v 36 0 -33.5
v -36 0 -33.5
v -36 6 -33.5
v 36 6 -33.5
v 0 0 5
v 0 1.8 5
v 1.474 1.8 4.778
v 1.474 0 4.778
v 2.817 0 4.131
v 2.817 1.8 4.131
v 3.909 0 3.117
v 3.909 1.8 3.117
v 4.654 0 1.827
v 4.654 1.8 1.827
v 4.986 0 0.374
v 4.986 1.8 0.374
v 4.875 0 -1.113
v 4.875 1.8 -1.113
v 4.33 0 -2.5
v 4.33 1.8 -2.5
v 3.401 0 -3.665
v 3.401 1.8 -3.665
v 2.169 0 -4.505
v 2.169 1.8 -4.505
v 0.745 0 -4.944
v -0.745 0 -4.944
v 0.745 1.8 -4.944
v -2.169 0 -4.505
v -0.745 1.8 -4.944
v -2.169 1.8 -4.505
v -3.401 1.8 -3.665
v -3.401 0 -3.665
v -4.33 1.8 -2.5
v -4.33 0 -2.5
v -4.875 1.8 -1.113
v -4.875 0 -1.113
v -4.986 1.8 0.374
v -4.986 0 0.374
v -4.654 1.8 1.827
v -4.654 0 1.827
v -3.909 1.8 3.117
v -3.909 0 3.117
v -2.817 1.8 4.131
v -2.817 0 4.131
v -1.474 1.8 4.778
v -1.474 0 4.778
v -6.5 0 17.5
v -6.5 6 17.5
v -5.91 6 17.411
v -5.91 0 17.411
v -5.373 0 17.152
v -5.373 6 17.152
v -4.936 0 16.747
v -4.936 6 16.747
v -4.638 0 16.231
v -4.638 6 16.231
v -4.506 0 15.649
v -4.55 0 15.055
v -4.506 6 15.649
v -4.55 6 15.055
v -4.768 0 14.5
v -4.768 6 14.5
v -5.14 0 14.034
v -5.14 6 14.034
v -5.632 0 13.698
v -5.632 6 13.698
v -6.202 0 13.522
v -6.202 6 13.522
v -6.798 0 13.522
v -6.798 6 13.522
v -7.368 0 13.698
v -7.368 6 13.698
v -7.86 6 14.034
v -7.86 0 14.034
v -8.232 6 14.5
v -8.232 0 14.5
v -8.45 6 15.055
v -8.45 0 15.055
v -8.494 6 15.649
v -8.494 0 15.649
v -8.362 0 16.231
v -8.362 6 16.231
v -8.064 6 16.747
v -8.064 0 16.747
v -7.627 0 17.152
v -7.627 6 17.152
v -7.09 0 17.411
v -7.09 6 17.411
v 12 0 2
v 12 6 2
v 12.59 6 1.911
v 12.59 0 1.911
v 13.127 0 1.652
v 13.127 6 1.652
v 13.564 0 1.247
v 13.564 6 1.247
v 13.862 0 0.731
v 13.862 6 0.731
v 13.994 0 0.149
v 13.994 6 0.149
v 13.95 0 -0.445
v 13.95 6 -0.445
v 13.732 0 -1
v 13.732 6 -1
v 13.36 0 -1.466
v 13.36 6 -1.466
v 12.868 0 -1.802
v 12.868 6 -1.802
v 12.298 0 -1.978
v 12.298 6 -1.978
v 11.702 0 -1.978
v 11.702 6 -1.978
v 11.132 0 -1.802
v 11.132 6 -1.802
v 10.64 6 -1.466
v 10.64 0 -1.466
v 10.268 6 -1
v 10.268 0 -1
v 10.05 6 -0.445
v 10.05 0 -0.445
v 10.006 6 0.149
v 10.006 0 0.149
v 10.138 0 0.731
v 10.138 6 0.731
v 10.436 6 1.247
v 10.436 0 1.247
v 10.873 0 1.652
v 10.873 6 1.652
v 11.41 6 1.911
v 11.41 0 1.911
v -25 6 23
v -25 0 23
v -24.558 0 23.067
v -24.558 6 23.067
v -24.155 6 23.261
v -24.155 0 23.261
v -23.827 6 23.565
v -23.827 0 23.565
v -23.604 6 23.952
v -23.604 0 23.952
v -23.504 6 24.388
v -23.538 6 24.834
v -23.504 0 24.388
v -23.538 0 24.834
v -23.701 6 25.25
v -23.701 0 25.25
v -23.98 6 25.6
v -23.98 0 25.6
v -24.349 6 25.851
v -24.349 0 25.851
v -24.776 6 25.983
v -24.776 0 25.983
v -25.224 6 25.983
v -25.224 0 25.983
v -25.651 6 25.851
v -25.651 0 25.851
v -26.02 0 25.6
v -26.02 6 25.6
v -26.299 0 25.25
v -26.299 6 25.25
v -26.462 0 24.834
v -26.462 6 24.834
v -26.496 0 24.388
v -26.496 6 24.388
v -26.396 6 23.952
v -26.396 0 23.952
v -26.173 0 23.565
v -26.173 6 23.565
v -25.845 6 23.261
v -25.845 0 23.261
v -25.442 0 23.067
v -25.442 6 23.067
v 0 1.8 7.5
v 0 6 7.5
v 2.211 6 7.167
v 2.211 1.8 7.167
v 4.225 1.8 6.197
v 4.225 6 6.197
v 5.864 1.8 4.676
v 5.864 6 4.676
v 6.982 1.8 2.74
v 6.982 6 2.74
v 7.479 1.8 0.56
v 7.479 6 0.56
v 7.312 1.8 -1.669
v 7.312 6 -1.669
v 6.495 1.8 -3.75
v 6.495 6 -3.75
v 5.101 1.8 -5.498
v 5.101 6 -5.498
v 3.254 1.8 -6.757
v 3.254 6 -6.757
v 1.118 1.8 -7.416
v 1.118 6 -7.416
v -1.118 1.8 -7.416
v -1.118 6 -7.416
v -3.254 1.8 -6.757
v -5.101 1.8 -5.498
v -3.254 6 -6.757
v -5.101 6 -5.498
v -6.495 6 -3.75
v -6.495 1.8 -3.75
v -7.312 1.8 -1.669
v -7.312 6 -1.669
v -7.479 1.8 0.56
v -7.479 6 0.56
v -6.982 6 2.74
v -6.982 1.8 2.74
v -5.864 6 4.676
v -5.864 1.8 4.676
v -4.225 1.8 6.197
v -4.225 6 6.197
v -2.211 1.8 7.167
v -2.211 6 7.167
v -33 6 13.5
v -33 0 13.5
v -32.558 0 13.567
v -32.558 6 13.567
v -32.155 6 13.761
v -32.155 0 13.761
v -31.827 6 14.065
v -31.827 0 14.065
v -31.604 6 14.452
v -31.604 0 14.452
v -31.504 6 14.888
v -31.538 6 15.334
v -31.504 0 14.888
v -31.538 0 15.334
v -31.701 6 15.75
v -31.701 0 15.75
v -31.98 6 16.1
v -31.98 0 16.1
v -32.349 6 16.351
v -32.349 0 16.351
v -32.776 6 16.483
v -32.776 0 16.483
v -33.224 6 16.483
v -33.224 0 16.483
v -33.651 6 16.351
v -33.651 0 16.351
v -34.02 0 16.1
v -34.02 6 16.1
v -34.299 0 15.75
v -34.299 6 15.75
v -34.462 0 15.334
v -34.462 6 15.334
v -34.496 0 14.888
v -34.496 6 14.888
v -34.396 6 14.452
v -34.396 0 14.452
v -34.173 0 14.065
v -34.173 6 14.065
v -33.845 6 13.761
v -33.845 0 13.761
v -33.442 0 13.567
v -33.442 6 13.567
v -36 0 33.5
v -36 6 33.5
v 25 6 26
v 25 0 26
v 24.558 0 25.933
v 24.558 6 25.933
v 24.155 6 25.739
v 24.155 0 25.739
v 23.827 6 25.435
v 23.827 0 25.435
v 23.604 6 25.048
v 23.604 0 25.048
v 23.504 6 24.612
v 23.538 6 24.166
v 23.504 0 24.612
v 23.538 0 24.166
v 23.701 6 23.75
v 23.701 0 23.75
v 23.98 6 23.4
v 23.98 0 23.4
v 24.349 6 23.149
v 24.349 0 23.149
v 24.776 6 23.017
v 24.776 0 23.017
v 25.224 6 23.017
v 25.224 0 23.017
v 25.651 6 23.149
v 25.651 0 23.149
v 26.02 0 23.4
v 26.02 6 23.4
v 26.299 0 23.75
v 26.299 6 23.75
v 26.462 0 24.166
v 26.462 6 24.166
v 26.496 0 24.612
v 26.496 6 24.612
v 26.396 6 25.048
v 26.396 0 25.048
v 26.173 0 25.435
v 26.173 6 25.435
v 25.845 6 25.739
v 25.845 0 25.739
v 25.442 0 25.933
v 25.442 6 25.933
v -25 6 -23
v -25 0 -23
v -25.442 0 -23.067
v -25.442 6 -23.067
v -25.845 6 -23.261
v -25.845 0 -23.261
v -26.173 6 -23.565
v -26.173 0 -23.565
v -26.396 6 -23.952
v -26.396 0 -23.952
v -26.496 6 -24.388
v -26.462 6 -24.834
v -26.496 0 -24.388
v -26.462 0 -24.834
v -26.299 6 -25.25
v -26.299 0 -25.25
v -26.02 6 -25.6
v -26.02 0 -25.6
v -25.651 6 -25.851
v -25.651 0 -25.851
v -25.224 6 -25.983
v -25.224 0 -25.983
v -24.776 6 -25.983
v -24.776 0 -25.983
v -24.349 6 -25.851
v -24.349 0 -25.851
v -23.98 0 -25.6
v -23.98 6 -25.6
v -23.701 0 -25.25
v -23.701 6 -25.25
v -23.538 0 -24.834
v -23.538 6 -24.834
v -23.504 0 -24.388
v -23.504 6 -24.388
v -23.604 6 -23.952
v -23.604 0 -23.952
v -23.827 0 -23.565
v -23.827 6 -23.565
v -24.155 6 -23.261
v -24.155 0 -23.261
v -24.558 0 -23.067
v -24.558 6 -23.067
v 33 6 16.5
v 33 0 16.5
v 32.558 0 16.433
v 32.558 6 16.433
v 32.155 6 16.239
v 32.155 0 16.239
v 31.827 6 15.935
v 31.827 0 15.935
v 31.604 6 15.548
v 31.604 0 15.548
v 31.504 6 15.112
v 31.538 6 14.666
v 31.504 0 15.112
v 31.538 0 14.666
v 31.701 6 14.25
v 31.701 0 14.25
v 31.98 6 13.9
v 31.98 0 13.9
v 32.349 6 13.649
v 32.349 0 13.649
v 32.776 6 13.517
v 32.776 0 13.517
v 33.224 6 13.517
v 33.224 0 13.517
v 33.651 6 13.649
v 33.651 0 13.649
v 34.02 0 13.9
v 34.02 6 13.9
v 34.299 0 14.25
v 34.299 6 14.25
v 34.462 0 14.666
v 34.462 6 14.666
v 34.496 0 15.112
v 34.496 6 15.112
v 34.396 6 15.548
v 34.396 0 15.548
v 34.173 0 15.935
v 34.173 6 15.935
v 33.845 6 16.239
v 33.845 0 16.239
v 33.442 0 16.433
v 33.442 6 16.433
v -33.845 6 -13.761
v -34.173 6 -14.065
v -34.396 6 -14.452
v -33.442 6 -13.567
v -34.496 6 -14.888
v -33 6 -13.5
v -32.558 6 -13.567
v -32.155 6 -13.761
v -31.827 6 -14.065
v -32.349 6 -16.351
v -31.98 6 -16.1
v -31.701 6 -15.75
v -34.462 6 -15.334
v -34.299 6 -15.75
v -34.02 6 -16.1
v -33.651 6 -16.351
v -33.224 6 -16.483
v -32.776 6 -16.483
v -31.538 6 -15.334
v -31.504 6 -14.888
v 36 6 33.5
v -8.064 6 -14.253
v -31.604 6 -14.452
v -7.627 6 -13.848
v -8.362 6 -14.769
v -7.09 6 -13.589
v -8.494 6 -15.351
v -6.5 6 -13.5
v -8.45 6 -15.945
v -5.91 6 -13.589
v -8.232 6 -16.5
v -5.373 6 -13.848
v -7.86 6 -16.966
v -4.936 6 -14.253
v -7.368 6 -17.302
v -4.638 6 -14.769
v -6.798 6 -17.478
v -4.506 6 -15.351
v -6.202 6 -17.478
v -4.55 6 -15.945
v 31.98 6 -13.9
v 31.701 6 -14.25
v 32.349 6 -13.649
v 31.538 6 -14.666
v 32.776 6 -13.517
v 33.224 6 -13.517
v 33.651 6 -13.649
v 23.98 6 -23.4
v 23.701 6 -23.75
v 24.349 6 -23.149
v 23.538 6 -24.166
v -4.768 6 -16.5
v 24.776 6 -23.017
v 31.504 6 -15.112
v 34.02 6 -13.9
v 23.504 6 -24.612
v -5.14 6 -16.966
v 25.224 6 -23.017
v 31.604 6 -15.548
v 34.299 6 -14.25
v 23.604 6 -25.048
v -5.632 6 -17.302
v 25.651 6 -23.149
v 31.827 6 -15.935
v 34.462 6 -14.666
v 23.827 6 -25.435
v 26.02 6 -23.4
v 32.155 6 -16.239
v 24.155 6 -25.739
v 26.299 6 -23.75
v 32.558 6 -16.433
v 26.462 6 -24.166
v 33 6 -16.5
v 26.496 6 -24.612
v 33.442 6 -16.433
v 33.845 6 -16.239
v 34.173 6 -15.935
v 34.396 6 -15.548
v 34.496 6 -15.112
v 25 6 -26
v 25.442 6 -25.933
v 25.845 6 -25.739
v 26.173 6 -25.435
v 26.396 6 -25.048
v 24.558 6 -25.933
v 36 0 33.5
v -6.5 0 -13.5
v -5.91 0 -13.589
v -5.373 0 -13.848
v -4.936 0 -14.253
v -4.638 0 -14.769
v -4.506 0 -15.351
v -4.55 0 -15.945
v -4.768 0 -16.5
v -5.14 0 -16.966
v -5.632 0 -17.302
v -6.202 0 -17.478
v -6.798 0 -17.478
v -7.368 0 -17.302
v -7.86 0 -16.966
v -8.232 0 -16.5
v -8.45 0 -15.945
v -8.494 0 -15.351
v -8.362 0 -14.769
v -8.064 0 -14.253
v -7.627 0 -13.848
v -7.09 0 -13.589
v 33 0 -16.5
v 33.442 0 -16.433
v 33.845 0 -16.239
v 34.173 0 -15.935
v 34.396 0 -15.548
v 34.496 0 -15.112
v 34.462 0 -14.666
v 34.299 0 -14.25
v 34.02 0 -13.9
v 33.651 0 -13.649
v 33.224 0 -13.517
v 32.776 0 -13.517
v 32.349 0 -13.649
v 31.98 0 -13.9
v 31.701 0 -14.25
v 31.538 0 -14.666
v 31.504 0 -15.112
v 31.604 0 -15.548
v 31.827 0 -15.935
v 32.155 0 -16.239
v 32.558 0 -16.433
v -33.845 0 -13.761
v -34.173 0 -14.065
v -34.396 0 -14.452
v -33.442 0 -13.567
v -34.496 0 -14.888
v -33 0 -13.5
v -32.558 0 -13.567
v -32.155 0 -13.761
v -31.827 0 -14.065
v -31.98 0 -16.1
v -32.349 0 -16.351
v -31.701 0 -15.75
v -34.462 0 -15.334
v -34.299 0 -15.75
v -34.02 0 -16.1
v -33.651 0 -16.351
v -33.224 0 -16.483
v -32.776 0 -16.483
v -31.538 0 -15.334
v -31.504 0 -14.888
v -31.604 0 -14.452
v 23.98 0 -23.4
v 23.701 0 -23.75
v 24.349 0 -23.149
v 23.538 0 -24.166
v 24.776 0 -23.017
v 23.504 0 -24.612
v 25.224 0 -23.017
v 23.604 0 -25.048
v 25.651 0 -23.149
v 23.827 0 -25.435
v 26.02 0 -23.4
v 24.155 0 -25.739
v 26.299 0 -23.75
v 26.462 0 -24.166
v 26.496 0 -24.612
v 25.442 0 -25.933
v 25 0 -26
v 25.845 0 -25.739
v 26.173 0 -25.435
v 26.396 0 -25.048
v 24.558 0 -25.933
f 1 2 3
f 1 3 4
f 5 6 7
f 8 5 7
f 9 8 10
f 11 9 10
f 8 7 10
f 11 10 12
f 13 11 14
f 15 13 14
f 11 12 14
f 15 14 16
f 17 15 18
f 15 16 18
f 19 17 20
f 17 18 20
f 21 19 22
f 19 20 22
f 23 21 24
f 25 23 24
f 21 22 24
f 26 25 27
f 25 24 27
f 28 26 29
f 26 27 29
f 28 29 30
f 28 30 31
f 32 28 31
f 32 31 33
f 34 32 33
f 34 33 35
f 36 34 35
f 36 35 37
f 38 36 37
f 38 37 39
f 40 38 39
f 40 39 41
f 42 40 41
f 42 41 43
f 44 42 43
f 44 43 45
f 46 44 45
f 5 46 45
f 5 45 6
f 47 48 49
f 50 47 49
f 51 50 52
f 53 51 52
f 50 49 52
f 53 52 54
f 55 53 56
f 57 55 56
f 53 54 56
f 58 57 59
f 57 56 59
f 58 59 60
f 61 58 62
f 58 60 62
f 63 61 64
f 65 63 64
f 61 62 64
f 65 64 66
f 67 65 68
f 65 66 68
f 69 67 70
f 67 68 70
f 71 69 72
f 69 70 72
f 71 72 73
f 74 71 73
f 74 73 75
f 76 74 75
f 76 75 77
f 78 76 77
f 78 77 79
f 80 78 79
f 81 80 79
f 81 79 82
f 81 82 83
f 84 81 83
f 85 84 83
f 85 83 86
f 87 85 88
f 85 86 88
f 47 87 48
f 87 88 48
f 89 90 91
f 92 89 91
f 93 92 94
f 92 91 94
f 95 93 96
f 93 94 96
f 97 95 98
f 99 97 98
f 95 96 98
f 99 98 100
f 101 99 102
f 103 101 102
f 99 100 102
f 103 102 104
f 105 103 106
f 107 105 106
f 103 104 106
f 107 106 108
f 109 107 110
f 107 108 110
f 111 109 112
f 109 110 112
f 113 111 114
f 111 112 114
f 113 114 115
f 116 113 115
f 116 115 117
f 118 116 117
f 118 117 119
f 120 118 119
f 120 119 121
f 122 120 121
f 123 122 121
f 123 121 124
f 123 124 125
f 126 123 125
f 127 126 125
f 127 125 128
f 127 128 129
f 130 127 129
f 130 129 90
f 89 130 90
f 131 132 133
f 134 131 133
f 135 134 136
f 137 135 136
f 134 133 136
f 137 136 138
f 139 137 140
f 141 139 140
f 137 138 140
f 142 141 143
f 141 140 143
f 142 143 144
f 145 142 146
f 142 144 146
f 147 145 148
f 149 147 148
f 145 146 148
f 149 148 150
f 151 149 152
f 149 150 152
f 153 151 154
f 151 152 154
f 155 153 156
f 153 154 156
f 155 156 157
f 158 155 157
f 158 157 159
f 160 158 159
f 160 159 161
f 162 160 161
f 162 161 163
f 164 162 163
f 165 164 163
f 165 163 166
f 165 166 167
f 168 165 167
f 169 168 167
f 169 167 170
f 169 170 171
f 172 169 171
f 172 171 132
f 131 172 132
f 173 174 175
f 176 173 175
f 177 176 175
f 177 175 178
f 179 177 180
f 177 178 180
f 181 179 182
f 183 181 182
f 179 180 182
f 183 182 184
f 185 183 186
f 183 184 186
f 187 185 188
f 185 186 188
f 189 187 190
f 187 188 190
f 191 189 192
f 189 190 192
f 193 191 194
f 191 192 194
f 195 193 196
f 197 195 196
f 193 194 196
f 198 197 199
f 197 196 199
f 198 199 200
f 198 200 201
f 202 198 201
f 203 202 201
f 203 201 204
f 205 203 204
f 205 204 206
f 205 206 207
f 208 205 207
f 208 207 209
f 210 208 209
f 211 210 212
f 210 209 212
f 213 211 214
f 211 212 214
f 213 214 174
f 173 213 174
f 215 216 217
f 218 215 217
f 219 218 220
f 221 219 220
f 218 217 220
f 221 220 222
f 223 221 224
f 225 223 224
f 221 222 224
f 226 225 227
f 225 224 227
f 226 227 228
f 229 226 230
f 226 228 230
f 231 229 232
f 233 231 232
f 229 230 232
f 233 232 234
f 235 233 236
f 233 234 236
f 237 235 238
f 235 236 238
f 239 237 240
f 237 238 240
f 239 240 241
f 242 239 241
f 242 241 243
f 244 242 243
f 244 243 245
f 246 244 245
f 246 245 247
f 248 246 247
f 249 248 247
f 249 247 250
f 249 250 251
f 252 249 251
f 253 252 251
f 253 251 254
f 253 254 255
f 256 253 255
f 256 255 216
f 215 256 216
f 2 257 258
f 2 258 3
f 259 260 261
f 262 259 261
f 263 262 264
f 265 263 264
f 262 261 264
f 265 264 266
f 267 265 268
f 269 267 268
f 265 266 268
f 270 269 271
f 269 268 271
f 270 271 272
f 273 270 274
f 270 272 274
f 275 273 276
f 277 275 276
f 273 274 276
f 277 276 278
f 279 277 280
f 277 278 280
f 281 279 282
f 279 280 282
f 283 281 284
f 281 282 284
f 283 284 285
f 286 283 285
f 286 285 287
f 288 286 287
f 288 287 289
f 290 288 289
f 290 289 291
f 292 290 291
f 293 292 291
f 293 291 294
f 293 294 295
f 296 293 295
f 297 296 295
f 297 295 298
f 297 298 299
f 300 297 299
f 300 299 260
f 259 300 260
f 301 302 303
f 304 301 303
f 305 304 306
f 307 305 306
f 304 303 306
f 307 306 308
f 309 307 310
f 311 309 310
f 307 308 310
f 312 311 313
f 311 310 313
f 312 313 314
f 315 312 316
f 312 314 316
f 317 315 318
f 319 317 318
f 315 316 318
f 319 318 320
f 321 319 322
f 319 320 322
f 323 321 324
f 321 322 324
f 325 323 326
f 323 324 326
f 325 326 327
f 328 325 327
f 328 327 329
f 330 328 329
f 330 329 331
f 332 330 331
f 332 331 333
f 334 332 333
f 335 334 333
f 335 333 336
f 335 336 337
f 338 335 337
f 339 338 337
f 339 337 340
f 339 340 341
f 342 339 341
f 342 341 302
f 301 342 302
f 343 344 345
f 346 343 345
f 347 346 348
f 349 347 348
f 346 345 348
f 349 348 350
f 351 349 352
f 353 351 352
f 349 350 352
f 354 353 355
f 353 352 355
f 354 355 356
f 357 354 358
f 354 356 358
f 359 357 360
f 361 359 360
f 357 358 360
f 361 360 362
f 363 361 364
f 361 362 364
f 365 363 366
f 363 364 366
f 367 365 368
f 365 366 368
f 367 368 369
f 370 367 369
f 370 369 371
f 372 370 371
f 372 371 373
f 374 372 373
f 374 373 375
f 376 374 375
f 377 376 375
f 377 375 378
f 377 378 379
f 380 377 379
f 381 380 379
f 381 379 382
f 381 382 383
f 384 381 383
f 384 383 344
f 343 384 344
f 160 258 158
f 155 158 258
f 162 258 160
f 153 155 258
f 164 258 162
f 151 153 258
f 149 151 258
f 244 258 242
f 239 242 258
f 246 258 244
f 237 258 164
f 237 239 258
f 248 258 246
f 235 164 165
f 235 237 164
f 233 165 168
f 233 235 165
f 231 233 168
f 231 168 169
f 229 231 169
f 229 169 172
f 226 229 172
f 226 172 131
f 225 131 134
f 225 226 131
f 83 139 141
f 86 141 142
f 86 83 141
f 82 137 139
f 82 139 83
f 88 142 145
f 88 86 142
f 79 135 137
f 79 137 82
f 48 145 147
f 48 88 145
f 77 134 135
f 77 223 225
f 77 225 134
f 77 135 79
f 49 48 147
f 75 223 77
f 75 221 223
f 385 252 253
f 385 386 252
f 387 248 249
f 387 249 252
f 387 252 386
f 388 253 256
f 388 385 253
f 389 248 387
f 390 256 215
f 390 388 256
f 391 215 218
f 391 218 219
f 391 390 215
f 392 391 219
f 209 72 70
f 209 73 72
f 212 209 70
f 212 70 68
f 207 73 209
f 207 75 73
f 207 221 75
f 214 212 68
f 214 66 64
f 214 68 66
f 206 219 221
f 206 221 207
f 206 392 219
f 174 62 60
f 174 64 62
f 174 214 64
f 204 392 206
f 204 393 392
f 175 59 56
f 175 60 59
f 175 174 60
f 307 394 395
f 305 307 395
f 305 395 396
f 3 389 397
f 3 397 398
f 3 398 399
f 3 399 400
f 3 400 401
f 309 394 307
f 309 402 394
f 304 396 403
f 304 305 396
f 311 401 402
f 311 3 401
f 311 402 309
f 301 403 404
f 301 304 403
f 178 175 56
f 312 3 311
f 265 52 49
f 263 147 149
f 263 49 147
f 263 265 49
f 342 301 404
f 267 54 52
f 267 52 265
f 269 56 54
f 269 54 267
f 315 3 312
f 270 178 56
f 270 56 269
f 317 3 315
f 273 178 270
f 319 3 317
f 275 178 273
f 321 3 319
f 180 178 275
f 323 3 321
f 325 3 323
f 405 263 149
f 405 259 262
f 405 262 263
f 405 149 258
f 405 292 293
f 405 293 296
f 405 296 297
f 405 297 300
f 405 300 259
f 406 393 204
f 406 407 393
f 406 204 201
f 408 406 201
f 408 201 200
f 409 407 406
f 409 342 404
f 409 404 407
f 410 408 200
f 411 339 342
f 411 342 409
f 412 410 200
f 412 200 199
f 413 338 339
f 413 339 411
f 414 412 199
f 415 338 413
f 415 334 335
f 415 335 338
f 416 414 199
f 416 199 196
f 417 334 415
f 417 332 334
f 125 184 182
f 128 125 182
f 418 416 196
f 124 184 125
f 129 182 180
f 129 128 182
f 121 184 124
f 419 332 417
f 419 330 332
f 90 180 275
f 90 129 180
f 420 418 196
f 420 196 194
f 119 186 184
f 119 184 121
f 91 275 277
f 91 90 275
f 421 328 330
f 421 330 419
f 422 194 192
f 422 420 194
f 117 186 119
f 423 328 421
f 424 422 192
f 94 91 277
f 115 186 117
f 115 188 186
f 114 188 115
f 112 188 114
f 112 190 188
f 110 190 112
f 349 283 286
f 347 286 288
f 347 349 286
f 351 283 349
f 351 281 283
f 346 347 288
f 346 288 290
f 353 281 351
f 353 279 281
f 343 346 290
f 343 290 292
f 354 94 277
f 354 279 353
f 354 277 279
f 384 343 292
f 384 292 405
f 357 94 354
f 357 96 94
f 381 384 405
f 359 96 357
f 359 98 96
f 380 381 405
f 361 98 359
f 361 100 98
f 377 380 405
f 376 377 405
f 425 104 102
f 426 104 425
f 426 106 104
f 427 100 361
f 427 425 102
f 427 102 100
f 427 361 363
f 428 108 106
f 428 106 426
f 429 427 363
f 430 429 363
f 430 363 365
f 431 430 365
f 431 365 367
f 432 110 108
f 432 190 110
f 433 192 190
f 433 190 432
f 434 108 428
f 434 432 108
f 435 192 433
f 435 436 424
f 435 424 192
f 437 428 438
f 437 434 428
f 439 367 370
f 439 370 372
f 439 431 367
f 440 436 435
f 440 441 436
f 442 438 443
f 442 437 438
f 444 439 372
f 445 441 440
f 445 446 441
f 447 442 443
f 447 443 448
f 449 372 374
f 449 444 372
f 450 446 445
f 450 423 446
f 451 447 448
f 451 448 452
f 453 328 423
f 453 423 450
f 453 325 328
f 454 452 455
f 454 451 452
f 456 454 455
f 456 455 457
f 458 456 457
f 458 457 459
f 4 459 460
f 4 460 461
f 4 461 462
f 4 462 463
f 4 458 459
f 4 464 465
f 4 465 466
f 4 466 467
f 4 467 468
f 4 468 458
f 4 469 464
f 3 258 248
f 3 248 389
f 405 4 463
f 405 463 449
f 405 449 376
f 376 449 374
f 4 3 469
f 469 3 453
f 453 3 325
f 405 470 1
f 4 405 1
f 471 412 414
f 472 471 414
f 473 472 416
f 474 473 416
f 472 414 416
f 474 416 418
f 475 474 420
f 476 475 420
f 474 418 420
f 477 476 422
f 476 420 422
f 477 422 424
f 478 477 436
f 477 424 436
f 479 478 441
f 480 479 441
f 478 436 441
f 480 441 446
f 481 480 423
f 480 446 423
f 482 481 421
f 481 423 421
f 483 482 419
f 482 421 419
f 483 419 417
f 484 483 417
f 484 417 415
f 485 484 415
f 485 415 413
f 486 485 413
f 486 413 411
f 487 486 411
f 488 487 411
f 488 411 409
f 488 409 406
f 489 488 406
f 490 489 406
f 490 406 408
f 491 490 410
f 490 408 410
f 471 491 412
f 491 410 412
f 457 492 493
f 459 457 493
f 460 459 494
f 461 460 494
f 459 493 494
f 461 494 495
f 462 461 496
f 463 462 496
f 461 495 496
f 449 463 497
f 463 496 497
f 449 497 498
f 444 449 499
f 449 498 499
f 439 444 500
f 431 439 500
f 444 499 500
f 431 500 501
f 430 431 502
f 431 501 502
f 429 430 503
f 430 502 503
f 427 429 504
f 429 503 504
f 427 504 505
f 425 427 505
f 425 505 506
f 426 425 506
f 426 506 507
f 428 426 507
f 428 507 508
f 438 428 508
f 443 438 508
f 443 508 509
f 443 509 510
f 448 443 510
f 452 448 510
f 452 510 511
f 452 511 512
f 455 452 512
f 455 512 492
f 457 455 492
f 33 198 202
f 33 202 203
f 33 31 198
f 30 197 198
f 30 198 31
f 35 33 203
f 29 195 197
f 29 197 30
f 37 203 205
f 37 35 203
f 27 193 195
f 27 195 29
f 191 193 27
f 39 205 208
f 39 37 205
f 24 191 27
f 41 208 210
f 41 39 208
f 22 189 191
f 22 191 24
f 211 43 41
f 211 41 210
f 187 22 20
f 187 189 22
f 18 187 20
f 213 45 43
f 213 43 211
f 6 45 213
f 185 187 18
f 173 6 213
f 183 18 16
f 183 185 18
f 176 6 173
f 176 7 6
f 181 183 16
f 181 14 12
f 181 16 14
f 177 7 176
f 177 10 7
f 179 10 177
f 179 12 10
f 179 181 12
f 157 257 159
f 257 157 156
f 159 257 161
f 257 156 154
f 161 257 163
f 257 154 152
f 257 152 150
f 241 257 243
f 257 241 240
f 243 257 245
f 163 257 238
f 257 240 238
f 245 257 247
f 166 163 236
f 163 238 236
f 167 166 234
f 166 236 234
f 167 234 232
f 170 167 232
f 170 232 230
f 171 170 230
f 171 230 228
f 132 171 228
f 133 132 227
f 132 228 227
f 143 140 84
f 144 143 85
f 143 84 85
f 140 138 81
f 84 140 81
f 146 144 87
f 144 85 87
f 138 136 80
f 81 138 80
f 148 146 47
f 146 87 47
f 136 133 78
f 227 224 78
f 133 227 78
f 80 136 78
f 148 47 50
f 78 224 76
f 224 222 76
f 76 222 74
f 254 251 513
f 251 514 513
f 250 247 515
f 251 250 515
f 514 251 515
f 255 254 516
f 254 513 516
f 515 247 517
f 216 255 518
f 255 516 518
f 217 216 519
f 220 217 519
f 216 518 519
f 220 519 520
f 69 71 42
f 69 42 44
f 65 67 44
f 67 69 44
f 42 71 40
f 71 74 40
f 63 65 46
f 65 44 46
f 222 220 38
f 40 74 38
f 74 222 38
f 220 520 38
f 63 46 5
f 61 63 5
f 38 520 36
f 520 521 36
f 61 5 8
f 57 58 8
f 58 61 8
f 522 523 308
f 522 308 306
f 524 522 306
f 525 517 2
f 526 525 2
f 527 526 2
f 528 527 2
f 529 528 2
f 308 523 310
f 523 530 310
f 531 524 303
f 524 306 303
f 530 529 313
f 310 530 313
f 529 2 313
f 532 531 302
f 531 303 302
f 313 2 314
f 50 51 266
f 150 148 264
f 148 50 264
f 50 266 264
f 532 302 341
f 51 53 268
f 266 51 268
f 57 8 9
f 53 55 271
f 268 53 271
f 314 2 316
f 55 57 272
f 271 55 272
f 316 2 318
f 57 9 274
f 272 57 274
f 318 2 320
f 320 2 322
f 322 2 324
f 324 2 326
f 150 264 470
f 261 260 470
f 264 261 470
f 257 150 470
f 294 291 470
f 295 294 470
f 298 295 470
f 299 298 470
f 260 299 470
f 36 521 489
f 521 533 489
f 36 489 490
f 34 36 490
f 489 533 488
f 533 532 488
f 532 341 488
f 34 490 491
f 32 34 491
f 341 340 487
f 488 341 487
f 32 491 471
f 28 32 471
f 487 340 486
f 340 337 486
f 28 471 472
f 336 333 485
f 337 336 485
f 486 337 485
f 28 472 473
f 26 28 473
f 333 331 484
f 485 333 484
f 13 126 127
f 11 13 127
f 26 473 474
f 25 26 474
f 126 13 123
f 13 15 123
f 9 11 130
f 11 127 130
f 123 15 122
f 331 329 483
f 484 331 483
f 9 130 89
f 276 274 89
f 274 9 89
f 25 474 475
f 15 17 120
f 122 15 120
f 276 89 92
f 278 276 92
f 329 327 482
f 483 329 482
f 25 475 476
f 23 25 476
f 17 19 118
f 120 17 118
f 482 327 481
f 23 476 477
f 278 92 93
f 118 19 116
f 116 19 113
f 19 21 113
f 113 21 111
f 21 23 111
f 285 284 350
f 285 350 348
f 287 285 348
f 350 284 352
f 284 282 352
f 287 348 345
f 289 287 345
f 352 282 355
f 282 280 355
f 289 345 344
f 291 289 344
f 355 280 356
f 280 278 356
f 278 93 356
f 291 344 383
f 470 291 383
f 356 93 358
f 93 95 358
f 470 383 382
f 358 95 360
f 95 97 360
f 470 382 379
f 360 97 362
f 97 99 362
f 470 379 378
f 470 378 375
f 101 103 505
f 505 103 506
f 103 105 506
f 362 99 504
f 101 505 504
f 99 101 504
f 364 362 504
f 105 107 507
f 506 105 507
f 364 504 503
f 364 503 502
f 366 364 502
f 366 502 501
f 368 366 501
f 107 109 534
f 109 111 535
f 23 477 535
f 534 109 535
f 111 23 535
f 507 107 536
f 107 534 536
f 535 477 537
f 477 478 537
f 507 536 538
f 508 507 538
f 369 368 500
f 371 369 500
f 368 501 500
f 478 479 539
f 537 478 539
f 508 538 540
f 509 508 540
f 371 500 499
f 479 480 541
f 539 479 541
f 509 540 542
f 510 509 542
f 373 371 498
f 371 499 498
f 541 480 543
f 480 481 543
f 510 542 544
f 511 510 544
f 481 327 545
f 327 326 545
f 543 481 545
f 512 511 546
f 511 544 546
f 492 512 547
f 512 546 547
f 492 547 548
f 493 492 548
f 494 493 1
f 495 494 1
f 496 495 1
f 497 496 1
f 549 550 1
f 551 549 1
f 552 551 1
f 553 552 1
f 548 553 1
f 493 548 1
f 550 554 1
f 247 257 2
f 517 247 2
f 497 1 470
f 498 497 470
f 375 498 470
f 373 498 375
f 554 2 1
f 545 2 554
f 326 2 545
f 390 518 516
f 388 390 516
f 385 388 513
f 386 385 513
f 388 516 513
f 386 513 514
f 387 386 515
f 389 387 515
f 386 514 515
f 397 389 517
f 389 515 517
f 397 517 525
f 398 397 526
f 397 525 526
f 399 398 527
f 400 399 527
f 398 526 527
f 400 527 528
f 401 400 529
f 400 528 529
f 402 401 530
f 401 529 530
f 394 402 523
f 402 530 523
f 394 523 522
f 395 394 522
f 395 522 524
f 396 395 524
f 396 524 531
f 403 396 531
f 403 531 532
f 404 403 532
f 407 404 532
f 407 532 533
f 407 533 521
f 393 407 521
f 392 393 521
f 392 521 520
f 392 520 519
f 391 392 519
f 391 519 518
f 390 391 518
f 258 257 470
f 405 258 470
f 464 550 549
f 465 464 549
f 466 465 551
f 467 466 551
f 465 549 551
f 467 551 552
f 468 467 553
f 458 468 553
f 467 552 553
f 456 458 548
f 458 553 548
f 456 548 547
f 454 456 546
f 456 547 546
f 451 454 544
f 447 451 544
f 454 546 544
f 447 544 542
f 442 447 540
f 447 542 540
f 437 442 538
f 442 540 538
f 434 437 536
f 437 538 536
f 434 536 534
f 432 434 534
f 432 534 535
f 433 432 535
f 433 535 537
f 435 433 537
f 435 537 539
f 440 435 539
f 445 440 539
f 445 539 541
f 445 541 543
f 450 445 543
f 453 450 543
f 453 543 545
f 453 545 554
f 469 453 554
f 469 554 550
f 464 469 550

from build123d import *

# Parameters (mm, degrees)
SKETCH1_W           = 72
SKETCH1_H           = 67
BOSS_EXTRUDE1_DEPTH = 6
SKETCH2_R           = 5
SKETCH2_R_2         = 2
CUT_EXTRUDE1_DEPTH  = 6
SKETCH3_R           = 7.5
CUT_EXTRUDE2_DEPTH  = 4.2
SKETCH5_R           = 2
CUT_EXTRUDE3_DEPTH  = 10
SKETCH6_R           = 1.5
CUT_EXTRUDE4_DEPTH  = 10


with BuildPart() as part:
    # Sketch1 → Boss-Extrude1 (new body)
    with BuildSketch(Plane(origin=(0, 0, 0), x_dir=(1, 0, 0), z_dir=(0, 1, 0))):
        Rectangle(SKETCH1_W, SKETCH1_H)
    extrude(amount=BOSS_EXTRUDE1_DEPTH)

    # Sketch2 → Cut-Extrude1 (cut)
    with BuildSketch(Plane(origin=(0, 6, 0), x_dir=(1, 0, 0), z_dir=(0, 1, 0))):
        with Locations(Location((0, 0, 0), (0, 0, 270))):
            Circle(SKETCH2_R)
        with Locations(Location((-6.5, 15.5, 0), (0, 0, 270))):
            Circle(SKETCH2_R_2)
        with Locations(Location((-6.5, -15.5, 0), (0, 0, 270))):
            Circle(SKETCH2_R_2)
    extrude(amount=-CUT_EXTRUDE1_DEPTH, mode=Mode.SUBTRACT)

    # Sketch3 → Cut-Extrude2 (cut)
    with BuildSketch(Plane(origin=(0, 6, 0), x_dir=(1, 0, 0), z_dir=(0, 1, 0))):
        with Locations(Location((0, 0, 0), (0, 0, 270))):
            Circle(SKETCH3_R)
    extrude(amount=-CUT_EXTRUDE2_DEPTH, mode=Mode.SUBTRACT)

    # Sketch5 → Cut-Extrude3 (cut)
    with BuildSketch(Plane(origin=(0, 6, 0), x_dir=(1, 0, 0), z_dir=(0, 1, 0))):
        with Locations(Location((12, 0, 0), (0, 0, 270))):
            Circle(SKETCH5_R)
    extrude(amount=-CUT_EXTRUDE3_DEPTH, mode=Mode.SUBTRACT)

    # Sketch6 → Cut-Extrude4 (cut)
    with BuildSketch(Plane.XZ):
        with Locations(Location((-25, 24.5, 0), (0, 0, 270))):
            Circle(SKETCH6_R)
        with Locations(Location((25, 24.5, 0), (0, 0, 90))):
            Circle(SKETCH6_R)
        with Locations(Location((-33, 15, 0), (0, 0, 270))):
            Circle(SKETCH6_R)
        with Locations(Location((33, 15, 0), (0, 0, 90))):
            Circle(SKETCH6_R)
        with Locations(Location((33, -15, 0), (0, 0, 270))):
            Circle(SKETCH6_R)
        with Locations(Location((-33, -15, 0), (0, 0, 90))):
            Circle(SKETCH6_R)
        with Locations(Location((25, -24.5, 0), (0, 0, 270))):
            Circle(SKETCH6_R)
        with Locations(Location((-25, -24.5, 0), (0, 0, 90))):
            Circle(SKETCH6_R)
    extrude(amount=-CUT_EXTRUDE4_DEPTH, mode=Mode.SUBTRACT)


solid = part.part
